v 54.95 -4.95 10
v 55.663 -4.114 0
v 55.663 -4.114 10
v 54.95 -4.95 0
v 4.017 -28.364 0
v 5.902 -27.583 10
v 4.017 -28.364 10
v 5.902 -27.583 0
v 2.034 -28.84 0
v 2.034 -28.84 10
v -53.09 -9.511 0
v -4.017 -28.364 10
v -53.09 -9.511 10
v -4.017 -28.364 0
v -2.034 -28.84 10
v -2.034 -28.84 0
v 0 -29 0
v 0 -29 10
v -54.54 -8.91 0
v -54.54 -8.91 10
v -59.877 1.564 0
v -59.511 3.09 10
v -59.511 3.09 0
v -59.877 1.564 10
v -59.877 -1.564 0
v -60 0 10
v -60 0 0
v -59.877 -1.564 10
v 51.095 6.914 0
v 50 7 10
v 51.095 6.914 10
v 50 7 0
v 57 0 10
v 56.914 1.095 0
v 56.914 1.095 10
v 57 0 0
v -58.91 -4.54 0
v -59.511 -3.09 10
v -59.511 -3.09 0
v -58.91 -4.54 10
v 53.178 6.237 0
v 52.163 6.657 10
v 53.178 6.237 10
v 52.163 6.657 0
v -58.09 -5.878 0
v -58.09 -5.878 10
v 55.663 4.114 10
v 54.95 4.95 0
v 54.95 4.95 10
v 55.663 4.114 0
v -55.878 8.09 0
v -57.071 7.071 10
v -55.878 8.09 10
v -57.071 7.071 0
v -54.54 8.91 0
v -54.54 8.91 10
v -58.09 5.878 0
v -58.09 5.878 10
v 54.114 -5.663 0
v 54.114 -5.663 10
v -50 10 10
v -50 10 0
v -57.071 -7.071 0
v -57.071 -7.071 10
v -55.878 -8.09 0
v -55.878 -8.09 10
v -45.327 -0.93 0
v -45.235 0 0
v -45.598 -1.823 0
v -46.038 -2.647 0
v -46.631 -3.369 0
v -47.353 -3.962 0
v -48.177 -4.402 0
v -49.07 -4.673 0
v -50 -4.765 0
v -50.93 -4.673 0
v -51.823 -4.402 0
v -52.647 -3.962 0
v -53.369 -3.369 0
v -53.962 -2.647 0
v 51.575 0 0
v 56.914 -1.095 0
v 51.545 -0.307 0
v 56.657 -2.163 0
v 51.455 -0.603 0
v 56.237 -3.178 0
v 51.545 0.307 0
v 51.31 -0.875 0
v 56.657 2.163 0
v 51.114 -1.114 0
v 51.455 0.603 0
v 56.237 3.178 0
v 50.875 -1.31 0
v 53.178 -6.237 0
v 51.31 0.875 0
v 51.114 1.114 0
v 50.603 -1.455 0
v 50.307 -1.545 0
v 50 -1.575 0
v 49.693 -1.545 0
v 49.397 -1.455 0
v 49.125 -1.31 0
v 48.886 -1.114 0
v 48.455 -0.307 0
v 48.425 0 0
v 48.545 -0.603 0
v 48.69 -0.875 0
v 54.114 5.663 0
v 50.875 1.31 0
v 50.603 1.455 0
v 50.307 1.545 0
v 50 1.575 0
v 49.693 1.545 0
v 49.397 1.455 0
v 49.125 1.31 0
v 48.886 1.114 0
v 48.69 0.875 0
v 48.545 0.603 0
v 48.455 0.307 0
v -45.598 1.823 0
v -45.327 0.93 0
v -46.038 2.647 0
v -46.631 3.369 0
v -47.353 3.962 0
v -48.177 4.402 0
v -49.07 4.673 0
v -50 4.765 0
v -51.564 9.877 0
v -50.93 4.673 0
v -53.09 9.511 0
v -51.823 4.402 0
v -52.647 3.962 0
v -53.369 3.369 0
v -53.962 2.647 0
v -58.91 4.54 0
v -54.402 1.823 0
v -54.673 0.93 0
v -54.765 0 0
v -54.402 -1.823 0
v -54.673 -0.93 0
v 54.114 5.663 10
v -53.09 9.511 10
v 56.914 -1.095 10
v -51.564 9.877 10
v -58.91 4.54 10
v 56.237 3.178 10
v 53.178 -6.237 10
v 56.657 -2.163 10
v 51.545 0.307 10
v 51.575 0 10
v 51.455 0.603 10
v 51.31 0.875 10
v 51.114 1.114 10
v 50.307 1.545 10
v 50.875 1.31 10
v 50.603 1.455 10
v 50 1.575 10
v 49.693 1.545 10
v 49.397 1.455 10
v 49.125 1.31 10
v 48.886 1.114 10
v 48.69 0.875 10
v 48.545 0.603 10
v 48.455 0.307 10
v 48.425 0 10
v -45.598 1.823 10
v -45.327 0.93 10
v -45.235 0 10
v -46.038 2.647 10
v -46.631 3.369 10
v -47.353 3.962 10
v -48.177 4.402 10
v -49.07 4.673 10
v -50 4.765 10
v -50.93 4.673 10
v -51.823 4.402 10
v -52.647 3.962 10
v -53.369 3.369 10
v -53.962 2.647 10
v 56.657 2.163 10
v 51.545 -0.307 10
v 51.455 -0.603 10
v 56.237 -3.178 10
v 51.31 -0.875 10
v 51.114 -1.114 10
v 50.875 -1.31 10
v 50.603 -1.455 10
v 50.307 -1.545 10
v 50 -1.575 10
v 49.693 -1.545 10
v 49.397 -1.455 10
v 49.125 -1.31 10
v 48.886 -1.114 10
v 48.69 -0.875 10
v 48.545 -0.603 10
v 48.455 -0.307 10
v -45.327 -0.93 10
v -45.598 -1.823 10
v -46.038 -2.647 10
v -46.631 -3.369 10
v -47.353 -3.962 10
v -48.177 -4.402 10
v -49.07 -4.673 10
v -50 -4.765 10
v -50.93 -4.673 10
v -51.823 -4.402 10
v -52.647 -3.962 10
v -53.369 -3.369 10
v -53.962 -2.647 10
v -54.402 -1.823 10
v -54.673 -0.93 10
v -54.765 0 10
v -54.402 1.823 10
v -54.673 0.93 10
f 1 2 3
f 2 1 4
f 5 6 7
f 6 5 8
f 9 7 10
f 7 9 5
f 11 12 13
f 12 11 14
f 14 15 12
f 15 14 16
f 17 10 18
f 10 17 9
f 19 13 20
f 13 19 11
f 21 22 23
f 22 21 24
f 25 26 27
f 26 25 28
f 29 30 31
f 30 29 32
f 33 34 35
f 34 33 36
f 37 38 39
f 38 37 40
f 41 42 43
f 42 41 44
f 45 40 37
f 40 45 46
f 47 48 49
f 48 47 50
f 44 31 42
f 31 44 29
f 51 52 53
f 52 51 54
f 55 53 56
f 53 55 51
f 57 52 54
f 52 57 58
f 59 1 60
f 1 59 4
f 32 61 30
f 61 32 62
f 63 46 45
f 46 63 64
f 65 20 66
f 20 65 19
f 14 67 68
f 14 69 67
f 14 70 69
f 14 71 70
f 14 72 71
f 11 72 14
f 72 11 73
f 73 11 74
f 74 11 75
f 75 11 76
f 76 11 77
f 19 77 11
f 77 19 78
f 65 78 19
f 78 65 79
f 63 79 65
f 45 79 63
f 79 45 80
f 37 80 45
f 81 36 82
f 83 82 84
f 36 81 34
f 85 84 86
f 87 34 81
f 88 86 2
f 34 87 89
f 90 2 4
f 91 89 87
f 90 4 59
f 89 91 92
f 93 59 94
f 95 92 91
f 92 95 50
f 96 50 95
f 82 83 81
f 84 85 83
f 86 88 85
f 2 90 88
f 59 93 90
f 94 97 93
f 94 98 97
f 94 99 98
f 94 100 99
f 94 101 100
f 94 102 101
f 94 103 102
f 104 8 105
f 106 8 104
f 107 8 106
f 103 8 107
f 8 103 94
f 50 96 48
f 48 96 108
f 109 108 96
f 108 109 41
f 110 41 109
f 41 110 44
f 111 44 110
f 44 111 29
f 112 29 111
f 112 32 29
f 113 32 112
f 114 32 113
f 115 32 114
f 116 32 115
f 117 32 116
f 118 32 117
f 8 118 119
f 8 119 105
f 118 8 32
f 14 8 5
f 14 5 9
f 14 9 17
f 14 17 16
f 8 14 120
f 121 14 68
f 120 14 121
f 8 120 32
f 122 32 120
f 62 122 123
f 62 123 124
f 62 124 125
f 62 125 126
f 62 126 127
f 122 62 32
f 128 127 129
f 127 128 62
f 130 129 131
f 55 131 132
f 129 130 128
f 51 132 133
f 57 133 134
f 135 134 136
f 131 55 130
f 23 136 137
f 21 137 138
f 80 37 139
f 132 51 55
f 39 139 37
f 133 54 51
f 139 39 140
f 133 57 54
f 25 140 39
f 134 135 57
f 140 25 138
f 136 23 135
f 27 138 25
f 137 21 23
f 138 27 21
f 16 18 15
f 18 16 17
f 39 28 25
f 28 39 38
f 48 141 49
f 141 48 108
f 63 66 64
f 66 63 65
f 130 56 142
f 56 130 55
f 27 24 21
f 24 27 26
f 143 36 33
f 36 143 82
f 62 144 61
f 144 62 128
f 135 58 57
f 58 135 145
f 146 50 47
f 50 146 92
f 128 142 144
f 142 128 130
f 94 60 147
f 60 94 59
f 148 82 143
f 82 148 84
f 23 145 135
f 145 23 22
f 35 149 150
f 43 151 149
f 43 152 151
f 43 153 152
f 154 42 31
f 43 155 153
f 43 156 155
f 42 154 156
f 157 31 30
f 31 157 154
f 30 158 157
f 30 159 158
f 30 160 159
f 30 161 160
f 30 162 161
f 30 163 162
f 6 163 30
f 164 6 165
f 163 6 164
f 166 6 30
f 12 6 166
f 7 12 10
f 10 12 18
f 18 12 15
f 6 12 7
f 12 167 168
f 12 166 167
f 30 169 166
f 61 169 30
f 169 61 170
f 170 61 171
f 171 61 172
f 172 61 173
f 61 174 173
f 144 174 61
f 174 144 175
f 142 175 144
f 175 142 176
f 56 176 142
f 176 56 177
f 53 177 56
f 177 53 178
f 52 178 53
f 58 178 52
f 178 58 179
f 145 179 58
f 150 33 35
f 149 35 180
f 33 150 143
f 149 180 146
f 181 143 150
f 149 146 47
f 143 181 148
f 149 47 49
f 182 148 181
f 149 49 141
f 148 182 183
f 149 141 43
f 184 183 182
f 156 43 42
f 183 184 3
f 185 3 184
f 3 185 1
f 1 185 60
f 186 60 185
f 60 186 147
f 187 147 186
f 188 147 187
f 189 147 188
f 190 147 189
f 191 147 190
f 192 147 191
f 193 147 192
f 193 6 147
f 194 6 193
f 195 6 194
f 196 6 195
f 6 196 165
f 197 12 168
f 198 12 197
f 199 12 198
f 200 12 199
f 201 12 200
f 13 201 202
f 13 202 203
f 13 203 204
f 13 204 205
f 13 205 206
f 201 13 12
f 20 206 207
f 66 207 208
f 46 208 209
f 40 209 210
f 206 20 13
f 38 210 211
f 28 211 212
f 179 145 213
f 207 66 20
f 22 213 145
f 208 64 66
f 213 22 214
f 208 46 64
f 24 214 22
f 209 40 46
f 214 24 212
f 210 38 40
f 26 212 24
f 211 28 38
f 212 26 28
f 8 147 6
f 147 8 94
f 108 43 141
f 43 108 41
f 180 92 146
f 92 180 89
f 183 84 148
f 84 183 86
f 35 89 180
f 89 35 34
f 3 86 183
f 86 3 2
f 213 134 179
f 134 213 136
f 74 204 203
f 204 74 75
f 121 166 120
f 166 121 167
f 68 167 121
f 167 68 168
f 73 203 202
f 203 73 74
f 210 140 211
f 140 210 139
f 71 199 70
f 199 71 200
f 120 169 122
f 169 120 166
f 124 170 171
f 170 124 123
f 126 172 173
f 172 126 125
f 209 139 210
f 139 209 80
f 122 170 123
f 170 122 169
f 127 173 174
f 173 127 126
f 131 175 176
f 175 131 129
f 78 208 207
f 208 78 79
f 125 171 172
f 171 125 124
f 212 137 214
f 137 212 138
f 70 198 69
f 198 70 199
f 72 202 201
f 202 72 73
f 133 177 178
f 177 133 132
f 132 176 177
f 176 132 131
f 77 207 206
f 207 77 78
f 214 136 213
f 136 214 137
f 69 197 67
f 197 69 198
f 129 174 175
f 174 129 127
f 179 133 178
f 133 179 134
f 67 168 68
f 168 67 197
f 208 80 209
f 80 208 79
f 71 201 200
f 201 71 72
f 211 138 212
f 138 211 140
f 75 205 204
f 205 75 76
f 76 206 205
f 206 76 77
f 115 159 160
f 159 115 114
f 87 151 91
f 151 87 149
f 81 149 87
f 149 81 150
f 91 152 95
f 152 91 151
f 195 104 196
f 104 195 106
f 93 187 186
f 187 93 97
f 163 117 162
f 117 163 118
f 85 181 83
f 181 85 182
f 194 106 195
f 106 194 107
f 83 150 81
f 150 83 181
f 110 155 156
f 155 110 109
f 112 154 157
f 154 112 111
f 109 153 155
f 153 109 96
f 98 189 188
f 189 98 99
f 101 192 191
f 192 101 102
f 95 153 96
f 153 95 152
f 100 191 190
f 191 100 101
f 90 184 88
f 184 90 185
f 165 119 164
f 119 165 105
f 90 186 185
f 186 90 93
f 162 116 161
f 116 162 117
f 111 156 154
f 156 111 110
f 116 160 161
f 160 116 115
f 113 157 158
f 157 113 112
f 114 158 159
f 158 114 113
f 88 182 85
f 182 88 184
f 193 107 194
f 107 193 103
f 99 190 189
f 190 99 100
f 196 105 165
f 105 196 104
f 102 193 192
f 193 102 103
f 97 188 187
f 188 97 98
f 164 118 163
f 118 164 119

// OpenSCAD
$fn = 32;

// ----------------------------------------------------------------------
// Lever: 100 mm between the bosses, 10 mm thick, smooth outline
// ----------------------------------------------------------------------

// --- parameters (mm) ---
lever_l = 100;            // distance between the boss centres
boss_a = 20;              // first boss diameter
boss_b = 14;              // second boss diameter
bore_a = 9.53;            // first bore
bore_b = 3.15;            // second bore
lever_t = 10;             // lever thickness
boss_c = 26;              // middle boss diameter
bend = 16;                // how far the middle boss drops

lever_profile = [[-60, 0], [-59.877, -1.564], [-59.511, -3.09], [-58.91, -4.54], [-58.09, -5.878], [-57.071, -7.071], [-55.878, -8.09], [-54.54, -8.91], [-53.09, -9.511], [-4.017, -28.364], [-2.034, -28.84], [0, -29], [2.034, -28.84], [4.017, -28.364], [5.902, -27.583], [53.178, -6.237], [54.114, -5.663], [54.95, -4.95], [55.663, -4.114], [56.237, -3.178], [56.657, -2.163], [56.914, -1.095], [57, 0], [56.914, 1.095], [56.657, 2.163], [56.237, 3.178], [55.663, 4.114], [54.95, 4.95], [54.114, 5.663], [53.178, 6.237], [52.163, 6.657], [51.095, 6.914], [50, 7], [-50, 10], [-51.564, 9.877], [-53.09, 9.511], [-54.54, 8.91], [-55.878, 8.09], [-57.071, 7.071], [-58.09, 5.878], [-58.91, 4.54], [-59.511, 3.09], [-59.877, 1.564]];

difference() {
  linear_extrude(height = lever_t) polygon(lever_profile);
  translate([-50, 0, -2.5]) cylinder(h = lever_t + 5, d = bore_a);
  translate([50, 0, -2.5]) cylinder(h = lever_t + 5, d = bore_b);
}
